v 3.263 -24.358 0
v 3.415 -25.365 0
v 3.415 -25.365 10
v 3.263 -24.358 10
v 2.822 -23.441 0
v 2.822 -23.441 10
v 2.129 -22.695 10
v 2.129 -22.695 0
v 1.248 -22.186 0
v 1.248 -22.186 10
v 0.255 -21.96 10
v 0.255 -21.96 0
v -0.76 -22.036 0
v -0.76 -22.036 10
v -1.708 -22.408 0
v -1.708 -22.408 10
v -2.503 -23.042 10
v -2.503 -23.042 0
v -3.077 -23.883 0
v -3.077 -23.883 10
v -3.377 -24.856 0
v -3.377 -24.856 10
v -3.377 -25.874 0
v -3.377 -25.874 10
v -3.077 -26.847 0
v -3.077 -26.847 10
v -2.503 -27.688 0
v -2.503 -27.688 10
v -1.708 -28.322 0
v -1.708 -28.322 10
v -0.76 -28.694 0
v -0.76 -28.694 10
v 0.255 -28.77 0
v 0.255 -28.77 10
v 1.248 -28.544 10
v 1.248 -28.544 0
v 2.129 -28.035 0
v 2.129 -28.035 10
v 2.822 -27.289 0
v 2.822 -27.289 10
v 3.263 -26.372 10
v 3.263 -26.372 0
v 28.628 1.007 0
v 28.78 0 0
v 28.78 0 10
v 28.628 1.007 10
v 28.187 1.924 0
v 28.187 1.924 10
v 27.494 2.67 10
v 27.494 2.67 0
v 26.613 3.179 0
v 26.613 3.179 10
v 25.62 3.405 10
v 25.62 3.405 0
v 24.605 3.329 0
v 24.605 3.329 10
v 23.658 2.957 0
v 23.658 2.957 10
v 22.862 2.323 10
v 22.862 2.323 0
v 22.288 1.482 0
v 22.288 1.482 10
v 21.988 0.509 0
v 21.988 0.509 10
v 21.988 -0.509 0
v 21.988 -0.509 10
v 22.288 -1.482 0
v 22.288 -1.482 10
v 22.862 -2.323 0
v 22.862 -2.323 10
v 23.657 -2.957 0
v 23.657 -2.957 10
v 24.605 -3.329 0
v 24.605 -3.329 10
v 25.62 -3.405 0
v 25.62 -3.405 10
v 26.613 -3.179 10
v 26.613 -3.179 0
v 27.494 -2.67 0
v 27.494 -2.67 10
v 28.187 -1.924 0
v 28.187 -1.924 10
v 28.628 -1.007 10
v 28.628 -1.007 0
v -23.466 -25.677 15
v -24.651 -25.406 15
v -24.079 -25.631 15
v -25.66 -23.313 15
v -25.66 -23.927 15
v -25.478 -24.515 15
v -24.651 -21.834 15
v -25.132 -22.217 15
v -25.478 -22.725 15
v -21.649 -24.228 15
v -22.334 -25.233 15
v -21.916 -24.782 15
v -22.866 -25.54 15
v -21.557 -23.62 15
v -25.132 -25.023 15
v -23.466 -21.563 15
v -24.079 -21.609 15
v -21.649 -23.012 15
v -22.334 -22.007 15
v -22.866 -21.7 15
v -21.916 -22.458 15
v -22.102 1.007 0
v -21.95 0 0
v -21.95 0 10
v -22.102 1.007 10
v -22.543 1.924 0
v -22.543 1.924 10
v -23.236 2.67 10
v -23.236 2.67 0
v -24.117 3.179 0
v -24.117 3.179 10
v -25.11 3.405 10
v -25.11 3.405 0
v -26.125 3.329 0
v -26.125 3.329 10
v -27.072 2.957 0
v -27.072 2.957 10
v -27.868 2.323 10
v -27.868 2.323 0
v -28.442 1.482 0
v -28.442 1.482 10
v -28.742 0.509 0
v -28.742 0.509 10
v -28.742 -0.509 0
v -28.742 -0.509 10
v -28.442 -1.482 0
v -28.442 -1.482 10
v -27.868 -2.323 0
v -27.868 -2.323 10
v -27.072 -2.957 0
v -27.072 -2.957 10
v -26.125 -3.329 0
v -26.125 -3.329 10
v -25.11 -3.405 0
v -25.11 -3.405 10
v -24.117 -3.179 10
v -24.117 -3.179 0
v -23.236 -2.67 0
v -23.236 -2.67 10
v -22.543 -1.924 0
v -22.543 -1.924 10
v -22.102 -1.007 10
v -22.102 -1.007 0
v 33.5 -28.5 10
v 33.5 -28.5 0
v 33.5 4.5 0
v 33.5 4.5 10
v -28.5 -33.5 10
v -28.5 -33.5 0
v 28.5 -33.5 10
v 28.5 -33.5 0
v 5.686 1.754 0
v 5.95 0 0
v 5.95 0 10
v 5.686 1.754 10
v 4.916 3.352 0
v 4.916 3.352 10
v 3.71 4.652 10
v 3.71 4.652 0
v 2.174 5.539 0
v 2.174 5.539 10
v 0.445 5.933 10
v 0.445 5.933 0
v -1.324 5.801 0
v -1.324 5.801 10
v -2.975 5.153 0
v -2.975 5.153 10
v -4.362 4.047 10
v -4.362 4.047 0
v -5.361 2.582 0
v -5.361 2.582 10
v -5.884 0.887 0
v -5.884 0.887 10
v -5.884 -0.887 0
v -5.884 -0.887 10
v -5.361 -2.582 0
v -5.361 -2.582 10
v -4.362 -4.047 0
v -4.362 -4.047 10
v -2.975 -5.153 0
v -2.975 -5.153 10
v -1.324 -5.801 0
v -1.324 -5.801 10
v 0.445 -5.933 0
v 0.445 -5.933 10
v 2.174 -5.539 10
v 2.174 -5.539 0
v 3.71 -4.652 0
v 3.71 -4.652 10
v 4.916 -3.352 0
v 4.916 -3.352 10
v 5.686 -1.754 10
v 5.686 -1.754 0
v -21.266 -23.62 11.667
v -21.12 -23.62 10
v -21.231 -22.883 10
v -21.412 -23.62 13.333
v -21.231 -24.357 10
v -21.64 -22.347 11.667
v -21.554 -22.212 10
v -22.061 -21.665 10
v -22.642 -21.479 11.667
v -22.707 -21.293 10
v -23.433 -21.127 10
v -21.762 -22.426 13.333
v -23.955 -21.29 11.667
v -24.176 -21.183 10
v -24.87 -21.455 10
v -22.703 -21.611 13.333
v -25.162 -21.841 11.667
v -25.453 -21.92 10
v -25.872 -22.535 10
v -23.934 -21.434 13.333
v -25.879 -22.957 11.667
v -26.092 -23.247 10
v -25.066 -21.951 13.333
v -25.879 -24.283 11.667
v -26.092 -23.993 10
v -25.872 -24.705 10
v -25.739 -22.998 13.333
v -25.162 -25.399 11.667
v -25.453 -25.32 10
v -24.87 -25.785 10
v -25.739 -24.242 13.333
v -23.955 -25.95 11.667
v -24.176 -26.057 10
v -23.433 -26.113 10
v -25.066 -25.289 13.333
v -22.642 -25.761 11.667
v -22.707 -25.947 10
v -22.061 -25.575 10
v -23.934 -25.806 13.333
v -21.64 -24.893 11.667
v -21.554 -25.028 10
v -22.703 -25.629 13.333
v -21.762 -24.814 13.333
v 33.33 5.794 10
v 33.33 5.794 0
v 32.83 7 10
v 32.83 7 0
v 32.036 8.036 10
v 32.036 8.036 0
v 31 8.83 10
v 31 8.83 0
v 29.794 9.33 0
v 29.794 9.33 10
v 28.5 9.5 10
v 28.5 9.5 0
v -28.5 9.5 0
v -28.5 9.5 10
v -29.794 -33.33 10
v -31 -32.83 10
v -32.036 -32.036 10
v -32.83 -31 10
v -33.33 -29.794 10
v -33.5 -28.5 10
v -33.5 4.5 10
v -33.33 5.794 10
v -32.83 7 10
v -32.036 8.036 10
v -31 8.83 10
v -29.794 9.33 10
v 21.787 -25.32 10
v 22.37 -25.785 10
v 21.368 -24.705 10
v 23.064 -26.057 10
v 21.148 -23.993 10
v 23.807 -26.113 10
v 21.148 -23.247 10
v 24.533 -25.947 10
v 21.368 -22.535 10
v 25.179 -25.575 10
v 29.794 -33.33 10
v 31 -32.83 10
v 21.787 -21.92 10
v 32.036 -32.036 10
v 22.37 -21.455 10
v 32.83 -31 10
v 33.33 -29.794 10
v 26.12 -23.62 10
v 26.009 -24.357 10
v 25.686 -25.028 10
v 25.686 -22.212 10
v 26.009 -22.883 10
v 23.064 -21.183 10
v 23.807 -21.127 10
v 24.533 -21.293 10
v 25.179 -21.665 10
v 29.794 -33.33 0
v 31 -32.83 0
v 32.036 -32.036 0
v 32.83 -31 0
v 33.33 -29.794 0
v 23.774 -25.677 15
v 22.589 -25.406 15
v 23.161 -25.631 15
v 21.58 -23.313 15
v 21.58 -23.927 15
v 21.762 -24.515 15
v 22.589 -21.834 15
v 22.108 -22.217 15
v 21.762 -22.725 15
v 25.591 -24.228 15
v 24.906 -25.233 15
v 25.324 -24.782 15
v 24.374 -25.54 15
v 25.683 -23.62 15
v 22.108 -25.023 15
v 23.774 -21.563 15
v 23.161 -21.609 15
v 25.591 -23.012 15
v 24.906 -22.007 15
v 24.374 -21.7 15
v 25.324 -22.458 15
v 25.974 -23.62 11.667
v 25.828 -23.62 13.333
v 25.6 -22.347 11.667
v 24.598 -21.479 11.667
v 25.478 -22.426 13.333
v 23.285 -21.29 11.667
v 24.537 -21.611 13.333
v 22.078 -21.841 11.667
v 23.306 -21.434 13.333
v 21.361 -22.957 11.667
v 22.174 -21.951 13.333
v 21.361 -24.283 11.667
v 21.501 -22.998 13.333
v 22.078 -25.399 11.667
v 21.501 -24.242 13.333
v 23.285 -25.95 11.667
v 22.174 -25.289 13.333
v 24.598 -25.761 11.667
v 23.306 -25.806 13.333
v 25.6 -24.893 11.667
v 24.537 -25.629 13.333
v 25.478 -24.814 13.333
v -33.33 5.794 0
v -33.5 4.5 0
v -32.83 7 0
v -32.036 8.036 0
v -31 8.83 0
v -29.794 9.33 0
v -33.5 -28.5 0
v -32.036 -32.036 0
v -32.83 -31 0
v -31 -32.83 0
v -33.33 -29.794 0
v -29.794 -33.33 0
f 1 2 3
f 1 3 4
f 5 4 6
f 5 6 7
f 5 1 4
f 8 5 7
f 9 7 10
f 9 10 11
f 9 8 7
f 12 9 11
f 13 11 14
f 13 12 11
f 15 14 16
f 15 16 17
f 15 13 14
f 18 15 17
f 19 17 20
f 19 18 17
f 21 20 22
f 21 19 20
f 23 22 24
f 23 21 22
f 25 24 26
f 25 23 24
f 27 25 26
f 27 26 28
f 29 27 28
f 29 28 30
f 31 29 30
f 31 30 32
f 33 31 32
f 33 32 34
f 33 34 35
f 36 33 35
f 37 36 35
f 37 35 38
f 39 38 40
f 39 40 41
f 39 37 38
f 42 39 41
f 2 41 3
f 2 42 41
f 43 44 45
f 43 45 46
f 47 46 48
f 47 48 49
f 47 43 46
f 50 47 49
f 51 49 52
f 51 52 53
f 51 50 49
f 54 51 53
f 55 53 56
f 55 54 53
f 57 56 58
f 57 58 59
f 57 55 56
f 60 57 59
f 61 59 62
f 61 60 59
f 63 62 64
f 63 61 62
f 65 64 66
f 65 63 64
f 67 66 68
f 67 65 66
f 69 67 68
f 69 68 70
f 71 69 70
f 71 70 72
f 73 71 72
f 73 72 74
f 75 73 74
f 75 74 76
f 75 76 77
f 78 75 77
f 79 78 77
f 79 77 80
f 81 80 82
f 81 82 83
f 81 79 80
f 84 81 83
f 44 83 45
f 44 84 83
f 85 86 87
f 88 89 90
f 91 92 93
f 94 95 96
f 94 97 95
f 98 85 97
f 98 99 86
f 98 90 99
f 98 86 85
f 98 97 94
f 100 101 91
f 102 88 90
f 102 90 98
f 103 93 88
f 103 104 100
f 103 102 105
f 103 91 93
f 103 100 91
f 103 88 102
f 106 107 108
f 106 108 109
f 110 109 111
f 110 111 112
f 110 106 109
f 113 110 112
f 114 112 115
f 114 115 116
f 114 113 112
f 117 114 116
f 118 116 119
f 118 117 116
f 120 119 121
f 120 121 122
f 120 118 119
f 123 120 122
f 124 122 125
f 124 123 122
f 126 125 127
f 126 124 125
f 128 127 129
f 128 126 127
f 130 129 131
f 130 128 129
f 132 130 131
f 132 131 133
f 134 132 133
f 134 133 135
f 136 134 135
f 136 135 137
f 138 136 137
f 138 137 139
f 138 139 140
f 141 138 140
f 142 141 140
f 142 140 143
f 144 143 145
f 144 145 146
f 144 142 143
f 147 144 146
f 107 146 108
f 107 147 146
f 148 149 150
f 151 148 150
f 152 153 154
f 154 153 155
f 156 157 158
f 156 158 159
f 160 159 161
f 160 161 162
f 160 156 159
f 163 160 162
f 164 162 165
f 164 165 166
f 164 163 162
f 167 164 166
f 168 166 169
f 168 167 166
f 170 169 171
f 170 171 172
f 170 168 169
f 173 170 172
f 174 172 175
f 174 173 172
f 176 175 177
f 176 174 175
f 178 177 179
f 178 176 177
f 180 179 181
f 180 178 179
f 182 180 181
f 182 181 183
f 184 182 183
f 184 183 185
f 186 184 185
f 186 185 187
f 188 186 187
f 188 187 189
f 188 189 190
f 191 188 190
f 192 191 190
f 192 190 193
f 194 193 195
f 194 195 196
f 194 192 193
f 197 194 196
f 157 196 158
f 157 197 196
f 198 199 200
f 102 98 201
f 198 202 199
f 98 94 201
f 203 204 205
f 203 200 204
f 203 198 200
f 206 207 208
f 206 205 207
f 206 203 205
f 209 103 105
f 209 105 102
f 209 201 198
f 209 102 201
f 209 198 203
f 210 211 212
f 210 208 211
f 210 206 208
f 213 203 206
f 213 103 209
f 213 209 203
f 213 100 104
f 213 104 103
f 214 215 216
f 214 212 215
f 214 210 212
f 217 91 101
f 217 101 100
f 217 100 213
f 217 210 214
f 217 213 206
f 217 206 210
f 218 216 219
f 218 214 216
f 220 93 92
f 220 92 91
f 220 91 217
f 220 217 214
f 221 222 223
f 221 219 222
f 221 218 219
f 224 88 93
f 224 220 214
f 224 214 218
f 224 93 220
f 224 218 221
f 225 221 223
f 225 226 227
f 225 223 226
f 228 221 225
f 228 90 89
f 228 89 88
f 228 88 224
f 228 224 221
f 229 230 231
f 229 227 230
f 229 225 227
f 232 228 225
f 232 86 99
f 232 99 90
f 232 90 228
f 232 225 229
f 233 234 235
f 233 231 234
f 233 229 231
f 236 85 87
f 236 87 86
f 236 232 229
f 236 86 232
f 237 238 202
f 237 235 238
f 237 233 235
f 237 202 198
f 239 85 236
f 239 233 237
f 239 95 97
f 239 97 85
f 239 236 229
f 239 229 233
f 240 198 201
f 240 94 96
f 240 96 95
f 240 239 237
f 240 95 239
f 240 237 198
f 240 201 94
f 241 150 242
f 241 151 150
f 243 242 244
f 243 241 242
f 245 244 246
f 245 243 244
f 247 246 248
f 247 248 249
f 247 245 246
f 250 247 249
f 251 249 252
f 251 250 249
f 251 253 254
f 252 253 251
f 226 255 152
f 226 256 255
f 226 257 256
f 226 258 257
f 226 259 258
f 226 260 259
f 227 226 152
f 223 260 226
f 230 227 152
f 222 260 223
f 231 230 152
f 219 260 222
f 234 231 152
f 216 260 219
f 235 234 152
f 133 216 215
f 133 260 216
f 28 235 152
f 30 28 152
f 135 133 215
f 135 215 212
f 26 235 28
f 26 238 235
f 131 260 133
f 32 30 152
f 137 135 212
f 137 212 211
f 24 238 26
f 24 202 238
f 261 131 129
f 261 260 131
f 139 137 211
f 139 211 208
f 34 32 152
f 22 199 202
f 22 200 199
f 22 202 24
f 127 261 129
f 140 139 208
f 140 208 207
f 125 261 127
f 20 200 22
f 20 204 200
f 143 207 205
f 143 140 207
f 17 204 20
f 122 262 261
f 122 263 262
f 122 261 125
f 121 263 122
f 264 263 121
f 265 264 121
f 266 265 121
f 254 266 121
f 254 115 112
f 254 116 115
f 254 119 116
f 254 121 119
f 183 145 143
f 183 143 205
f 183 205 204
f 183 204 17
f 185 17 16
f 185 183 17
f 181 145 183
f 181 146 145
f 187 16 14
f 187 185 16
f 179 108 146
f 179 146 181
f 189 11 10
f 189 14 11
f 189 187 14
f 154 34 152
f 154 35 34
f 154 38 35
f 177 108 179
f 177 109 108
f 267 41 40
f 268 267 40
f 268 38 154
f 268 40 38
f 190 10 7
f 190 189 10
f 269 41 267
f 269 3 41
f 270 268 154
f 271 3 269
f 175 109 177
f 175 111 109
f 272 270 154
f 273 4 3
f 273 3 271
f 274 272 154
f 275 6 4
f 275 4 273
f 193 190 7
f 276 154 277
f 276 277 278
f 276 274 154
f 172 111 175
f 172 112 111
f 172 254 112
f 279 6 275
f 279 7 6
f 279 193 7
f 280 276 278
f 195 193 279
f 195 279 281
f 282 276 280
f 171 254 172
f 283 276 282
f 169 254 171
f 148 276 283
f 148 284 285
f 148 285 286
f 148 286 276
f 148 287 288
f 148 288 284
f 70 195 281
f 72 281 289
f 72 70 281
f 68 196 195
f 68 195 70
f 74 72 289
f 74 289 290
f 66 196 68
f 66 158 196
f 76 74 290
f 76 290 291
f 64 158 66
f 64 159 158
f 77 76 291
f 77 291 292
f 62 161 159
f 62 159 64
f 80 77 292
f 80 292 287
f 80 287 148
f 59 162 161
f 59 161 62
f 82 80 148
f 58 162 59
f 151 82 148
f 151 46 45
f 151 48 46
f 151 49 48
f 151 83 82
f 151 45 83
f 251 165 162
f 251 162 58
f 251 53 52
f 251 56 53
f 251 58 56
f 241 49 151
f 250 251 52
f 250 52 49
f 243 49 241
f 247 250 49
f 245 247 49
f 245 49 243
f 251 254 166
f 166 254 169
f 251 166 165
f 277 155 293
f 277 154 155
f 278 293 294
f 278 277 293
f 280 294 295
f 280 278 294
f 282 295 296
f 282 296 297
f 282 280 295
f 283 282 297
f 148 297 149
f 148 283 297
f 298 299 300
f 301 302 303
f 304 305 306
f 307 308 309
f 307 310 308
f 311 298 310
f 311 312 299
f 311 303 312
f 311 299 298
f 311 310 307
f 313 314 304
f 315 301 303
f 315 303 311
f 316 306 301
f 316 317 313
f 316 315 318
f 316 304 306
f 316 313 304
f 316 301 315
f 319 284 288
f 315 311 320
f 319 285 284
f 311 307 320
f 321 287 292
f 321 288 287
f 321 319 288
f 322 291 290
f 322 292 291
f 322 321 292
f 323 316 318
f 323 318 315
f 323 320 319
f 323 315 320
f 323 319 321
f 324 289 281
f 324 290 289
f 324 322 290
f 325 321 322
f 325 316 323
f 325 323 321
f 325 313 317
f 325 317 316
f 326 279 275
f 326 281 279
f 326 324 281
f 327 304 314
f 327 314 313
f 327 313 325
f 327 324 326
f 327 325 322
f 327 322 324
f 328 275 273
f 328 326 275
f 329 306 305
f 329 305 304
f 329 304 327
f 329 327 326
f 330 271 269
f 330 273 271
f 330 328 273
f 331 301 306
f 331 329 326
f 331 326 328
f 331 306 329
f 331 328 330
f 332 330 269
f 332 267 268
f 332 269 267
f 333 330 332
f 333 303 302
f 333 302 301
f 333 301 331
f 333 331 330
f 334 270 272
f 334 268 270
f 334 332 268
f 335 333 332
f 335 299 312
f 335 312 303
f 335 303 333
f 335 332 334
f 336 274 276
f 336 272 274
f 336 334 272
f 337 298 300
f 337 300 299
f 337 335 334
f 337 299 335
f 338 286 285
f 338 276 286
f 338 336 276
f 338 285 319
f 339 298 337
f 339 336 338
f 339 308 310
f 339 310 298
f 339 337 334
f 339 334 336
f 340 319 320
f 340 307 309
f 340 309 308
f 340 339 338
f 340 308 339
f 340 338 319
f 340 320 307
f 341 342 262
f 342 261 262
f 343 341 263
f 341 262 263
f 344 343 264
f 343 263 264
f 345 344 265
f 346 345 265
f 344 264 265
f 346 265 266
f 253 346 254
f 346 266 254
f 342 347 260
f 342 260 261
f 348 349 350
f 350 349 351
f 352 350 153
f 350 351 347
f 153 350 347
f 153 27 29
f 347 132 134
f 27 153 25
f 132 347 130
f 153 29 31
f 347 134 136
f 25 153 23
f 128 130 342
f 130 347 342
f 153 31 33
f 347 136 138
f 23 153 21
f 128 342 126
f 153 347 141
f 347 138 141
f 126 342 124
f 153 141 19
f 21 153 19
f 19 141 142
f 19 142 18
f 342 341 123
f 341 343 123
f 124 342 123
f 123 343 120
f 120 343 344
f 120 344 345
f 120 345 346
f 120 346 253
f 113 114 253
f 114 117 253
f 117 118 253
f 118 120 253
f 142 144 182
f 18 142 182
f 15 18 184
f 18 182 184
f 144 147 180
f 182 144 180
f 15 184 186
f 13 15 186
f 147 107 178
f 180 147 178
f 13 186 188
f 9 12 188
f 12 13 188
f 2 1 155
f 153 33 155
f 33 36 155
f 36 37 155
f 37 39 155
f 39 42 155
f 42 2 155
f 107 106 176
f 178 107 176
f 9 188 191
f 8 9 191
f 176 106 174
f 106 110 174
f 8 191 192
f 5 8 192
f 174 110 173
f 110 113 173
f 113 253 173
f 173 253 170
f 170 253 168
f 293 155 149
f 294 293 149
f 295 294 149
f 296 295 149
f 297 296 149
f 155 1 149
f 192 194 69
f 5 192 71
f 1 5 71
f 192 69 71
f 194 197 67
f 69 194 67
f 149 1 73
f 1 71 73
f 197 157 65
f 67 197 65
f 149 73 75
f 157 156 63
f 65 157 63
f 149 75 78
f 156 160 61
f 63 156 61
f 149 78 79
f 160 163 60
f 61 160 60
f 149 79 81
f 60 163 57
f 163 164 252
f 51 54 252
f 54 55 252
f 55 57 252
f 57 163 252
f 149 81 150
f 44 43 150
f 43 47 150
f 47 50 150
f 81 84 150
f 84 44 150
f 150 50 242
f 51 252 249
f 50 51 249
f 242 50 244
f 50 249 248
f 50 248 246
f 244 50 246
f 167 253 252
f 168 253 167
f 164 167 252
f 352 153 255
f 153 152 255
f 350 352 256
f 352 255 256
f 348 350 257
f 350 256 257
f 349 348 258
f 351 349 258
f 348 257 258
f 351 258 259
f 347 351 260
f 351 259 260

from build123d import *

# Parameters (mm, degrees)
F0_W     = 29.9564684167
F0_H     = 43
F0_R     = 5.425
F0_R_2   = 5.95
F1_DEPTH = 10
F0_W_2   = 18.5217657917
F2_DEPTH = 10
F0_R_3   = 3.415
F3_DEPTH = 10
F4_DEPTH = 10
F6_R     = 2.5
F7_DEPTH = 5
F7_TAPER = 5
F8_R     = 5


with BuildPart() as f1:
    # F0 (on Top) → F1 (new body)
    with BuildSketch(Plane.XY):
        with Locations((0, -12)):
            Rectangle(F0_W, F0_H)
        with Locations((0, -25.365)):
            Circle(F0_R, mode=Mode.SUBTRACT)
        Circle(F0_R_2, mode=Mode.SUBTRACT)
    extrude(amount=F1_DEPTH)

    # F0 (on Top) → F2 (join)
    with BuildSketch(Plane.XY):
        with Locations((-24.2391171042, -12)):
            Rectangle(F0_W_2, F0_H)
        with Locations((-25.365, 0)):
            Circle(F0_R, mode=Mode.SUBTRACT)
        with Locations((24.2391171042, -12)):
            Rectangle(F0_W_2, F0_H)
        with Locations((25.365, 0)):
            Circle(F0_R, mode=Mode.SUBTRACT)
    extrude(amount=F2_DEPTH)

    # F0 (on Top) → F3 (join)
    with BuildSketch(Plane.XY):
        with Locations((-25.365, 0)):
            Circle(F0_R)
        with Locations((-25.365, 0)):
            Circle(F0_R_3, mode=Mode.SUBTRACT)
        with Locations((25.365, 0)):
            Circle(F0_R)
        with Locations((25.365, 0)):
            Circle(F0_R_3, mode=Mode.SUBTRACT)
        with Locations((0, -25.365)):
            Circle(F0_R)
        with Locations((0, -25.365)):
            Circle(F0_R_3, mode=Mode.SUBTRACT)
    extrude(amount=F3_DEPTH)

    # F0 (on Top) → F4 (join)
    with BuildSketch(Plane.XY):
        with Locations((24.2391171042, -12)):
            Rectangle(F0_W_2, F0_H)
        with Locations((25.365, 0)):
            Circle(F0_R, mode=Mode.SUBTRACT)
        with Locations((-24.2391171042, -12)):
            Rectangle(F0_W_2, F0_H)
        with Locations((-25.365, 0)):
            Circle(F0_R, mode=Mode.SUBTRACT)
    extrude(amount=F4_DEPTH)

    # F6 (on face) → F7 (join)
    with BuildSketch(Plane.XY.offset(10)):
        with Locations((-23.62, -23.62)):
            Circle(F6_R)
        with Locations((23.62, -23.62)):
            Circle(F6_R)
    extrude(amount=F7_DEPTH, taper=F7_TAPER)

    # F8
    f8_edges = [f1.edges().sort_by_distance(p)[0] for p in [
        (-33.5, -33.5, 5),
        (33.5, -33.5, 5),
        (33.5, 9.5, 5),
        (-33.5, 9.5, 5),
    ]]
    fillet(f8_edges, radius=F8_R)


solid = f1.part
